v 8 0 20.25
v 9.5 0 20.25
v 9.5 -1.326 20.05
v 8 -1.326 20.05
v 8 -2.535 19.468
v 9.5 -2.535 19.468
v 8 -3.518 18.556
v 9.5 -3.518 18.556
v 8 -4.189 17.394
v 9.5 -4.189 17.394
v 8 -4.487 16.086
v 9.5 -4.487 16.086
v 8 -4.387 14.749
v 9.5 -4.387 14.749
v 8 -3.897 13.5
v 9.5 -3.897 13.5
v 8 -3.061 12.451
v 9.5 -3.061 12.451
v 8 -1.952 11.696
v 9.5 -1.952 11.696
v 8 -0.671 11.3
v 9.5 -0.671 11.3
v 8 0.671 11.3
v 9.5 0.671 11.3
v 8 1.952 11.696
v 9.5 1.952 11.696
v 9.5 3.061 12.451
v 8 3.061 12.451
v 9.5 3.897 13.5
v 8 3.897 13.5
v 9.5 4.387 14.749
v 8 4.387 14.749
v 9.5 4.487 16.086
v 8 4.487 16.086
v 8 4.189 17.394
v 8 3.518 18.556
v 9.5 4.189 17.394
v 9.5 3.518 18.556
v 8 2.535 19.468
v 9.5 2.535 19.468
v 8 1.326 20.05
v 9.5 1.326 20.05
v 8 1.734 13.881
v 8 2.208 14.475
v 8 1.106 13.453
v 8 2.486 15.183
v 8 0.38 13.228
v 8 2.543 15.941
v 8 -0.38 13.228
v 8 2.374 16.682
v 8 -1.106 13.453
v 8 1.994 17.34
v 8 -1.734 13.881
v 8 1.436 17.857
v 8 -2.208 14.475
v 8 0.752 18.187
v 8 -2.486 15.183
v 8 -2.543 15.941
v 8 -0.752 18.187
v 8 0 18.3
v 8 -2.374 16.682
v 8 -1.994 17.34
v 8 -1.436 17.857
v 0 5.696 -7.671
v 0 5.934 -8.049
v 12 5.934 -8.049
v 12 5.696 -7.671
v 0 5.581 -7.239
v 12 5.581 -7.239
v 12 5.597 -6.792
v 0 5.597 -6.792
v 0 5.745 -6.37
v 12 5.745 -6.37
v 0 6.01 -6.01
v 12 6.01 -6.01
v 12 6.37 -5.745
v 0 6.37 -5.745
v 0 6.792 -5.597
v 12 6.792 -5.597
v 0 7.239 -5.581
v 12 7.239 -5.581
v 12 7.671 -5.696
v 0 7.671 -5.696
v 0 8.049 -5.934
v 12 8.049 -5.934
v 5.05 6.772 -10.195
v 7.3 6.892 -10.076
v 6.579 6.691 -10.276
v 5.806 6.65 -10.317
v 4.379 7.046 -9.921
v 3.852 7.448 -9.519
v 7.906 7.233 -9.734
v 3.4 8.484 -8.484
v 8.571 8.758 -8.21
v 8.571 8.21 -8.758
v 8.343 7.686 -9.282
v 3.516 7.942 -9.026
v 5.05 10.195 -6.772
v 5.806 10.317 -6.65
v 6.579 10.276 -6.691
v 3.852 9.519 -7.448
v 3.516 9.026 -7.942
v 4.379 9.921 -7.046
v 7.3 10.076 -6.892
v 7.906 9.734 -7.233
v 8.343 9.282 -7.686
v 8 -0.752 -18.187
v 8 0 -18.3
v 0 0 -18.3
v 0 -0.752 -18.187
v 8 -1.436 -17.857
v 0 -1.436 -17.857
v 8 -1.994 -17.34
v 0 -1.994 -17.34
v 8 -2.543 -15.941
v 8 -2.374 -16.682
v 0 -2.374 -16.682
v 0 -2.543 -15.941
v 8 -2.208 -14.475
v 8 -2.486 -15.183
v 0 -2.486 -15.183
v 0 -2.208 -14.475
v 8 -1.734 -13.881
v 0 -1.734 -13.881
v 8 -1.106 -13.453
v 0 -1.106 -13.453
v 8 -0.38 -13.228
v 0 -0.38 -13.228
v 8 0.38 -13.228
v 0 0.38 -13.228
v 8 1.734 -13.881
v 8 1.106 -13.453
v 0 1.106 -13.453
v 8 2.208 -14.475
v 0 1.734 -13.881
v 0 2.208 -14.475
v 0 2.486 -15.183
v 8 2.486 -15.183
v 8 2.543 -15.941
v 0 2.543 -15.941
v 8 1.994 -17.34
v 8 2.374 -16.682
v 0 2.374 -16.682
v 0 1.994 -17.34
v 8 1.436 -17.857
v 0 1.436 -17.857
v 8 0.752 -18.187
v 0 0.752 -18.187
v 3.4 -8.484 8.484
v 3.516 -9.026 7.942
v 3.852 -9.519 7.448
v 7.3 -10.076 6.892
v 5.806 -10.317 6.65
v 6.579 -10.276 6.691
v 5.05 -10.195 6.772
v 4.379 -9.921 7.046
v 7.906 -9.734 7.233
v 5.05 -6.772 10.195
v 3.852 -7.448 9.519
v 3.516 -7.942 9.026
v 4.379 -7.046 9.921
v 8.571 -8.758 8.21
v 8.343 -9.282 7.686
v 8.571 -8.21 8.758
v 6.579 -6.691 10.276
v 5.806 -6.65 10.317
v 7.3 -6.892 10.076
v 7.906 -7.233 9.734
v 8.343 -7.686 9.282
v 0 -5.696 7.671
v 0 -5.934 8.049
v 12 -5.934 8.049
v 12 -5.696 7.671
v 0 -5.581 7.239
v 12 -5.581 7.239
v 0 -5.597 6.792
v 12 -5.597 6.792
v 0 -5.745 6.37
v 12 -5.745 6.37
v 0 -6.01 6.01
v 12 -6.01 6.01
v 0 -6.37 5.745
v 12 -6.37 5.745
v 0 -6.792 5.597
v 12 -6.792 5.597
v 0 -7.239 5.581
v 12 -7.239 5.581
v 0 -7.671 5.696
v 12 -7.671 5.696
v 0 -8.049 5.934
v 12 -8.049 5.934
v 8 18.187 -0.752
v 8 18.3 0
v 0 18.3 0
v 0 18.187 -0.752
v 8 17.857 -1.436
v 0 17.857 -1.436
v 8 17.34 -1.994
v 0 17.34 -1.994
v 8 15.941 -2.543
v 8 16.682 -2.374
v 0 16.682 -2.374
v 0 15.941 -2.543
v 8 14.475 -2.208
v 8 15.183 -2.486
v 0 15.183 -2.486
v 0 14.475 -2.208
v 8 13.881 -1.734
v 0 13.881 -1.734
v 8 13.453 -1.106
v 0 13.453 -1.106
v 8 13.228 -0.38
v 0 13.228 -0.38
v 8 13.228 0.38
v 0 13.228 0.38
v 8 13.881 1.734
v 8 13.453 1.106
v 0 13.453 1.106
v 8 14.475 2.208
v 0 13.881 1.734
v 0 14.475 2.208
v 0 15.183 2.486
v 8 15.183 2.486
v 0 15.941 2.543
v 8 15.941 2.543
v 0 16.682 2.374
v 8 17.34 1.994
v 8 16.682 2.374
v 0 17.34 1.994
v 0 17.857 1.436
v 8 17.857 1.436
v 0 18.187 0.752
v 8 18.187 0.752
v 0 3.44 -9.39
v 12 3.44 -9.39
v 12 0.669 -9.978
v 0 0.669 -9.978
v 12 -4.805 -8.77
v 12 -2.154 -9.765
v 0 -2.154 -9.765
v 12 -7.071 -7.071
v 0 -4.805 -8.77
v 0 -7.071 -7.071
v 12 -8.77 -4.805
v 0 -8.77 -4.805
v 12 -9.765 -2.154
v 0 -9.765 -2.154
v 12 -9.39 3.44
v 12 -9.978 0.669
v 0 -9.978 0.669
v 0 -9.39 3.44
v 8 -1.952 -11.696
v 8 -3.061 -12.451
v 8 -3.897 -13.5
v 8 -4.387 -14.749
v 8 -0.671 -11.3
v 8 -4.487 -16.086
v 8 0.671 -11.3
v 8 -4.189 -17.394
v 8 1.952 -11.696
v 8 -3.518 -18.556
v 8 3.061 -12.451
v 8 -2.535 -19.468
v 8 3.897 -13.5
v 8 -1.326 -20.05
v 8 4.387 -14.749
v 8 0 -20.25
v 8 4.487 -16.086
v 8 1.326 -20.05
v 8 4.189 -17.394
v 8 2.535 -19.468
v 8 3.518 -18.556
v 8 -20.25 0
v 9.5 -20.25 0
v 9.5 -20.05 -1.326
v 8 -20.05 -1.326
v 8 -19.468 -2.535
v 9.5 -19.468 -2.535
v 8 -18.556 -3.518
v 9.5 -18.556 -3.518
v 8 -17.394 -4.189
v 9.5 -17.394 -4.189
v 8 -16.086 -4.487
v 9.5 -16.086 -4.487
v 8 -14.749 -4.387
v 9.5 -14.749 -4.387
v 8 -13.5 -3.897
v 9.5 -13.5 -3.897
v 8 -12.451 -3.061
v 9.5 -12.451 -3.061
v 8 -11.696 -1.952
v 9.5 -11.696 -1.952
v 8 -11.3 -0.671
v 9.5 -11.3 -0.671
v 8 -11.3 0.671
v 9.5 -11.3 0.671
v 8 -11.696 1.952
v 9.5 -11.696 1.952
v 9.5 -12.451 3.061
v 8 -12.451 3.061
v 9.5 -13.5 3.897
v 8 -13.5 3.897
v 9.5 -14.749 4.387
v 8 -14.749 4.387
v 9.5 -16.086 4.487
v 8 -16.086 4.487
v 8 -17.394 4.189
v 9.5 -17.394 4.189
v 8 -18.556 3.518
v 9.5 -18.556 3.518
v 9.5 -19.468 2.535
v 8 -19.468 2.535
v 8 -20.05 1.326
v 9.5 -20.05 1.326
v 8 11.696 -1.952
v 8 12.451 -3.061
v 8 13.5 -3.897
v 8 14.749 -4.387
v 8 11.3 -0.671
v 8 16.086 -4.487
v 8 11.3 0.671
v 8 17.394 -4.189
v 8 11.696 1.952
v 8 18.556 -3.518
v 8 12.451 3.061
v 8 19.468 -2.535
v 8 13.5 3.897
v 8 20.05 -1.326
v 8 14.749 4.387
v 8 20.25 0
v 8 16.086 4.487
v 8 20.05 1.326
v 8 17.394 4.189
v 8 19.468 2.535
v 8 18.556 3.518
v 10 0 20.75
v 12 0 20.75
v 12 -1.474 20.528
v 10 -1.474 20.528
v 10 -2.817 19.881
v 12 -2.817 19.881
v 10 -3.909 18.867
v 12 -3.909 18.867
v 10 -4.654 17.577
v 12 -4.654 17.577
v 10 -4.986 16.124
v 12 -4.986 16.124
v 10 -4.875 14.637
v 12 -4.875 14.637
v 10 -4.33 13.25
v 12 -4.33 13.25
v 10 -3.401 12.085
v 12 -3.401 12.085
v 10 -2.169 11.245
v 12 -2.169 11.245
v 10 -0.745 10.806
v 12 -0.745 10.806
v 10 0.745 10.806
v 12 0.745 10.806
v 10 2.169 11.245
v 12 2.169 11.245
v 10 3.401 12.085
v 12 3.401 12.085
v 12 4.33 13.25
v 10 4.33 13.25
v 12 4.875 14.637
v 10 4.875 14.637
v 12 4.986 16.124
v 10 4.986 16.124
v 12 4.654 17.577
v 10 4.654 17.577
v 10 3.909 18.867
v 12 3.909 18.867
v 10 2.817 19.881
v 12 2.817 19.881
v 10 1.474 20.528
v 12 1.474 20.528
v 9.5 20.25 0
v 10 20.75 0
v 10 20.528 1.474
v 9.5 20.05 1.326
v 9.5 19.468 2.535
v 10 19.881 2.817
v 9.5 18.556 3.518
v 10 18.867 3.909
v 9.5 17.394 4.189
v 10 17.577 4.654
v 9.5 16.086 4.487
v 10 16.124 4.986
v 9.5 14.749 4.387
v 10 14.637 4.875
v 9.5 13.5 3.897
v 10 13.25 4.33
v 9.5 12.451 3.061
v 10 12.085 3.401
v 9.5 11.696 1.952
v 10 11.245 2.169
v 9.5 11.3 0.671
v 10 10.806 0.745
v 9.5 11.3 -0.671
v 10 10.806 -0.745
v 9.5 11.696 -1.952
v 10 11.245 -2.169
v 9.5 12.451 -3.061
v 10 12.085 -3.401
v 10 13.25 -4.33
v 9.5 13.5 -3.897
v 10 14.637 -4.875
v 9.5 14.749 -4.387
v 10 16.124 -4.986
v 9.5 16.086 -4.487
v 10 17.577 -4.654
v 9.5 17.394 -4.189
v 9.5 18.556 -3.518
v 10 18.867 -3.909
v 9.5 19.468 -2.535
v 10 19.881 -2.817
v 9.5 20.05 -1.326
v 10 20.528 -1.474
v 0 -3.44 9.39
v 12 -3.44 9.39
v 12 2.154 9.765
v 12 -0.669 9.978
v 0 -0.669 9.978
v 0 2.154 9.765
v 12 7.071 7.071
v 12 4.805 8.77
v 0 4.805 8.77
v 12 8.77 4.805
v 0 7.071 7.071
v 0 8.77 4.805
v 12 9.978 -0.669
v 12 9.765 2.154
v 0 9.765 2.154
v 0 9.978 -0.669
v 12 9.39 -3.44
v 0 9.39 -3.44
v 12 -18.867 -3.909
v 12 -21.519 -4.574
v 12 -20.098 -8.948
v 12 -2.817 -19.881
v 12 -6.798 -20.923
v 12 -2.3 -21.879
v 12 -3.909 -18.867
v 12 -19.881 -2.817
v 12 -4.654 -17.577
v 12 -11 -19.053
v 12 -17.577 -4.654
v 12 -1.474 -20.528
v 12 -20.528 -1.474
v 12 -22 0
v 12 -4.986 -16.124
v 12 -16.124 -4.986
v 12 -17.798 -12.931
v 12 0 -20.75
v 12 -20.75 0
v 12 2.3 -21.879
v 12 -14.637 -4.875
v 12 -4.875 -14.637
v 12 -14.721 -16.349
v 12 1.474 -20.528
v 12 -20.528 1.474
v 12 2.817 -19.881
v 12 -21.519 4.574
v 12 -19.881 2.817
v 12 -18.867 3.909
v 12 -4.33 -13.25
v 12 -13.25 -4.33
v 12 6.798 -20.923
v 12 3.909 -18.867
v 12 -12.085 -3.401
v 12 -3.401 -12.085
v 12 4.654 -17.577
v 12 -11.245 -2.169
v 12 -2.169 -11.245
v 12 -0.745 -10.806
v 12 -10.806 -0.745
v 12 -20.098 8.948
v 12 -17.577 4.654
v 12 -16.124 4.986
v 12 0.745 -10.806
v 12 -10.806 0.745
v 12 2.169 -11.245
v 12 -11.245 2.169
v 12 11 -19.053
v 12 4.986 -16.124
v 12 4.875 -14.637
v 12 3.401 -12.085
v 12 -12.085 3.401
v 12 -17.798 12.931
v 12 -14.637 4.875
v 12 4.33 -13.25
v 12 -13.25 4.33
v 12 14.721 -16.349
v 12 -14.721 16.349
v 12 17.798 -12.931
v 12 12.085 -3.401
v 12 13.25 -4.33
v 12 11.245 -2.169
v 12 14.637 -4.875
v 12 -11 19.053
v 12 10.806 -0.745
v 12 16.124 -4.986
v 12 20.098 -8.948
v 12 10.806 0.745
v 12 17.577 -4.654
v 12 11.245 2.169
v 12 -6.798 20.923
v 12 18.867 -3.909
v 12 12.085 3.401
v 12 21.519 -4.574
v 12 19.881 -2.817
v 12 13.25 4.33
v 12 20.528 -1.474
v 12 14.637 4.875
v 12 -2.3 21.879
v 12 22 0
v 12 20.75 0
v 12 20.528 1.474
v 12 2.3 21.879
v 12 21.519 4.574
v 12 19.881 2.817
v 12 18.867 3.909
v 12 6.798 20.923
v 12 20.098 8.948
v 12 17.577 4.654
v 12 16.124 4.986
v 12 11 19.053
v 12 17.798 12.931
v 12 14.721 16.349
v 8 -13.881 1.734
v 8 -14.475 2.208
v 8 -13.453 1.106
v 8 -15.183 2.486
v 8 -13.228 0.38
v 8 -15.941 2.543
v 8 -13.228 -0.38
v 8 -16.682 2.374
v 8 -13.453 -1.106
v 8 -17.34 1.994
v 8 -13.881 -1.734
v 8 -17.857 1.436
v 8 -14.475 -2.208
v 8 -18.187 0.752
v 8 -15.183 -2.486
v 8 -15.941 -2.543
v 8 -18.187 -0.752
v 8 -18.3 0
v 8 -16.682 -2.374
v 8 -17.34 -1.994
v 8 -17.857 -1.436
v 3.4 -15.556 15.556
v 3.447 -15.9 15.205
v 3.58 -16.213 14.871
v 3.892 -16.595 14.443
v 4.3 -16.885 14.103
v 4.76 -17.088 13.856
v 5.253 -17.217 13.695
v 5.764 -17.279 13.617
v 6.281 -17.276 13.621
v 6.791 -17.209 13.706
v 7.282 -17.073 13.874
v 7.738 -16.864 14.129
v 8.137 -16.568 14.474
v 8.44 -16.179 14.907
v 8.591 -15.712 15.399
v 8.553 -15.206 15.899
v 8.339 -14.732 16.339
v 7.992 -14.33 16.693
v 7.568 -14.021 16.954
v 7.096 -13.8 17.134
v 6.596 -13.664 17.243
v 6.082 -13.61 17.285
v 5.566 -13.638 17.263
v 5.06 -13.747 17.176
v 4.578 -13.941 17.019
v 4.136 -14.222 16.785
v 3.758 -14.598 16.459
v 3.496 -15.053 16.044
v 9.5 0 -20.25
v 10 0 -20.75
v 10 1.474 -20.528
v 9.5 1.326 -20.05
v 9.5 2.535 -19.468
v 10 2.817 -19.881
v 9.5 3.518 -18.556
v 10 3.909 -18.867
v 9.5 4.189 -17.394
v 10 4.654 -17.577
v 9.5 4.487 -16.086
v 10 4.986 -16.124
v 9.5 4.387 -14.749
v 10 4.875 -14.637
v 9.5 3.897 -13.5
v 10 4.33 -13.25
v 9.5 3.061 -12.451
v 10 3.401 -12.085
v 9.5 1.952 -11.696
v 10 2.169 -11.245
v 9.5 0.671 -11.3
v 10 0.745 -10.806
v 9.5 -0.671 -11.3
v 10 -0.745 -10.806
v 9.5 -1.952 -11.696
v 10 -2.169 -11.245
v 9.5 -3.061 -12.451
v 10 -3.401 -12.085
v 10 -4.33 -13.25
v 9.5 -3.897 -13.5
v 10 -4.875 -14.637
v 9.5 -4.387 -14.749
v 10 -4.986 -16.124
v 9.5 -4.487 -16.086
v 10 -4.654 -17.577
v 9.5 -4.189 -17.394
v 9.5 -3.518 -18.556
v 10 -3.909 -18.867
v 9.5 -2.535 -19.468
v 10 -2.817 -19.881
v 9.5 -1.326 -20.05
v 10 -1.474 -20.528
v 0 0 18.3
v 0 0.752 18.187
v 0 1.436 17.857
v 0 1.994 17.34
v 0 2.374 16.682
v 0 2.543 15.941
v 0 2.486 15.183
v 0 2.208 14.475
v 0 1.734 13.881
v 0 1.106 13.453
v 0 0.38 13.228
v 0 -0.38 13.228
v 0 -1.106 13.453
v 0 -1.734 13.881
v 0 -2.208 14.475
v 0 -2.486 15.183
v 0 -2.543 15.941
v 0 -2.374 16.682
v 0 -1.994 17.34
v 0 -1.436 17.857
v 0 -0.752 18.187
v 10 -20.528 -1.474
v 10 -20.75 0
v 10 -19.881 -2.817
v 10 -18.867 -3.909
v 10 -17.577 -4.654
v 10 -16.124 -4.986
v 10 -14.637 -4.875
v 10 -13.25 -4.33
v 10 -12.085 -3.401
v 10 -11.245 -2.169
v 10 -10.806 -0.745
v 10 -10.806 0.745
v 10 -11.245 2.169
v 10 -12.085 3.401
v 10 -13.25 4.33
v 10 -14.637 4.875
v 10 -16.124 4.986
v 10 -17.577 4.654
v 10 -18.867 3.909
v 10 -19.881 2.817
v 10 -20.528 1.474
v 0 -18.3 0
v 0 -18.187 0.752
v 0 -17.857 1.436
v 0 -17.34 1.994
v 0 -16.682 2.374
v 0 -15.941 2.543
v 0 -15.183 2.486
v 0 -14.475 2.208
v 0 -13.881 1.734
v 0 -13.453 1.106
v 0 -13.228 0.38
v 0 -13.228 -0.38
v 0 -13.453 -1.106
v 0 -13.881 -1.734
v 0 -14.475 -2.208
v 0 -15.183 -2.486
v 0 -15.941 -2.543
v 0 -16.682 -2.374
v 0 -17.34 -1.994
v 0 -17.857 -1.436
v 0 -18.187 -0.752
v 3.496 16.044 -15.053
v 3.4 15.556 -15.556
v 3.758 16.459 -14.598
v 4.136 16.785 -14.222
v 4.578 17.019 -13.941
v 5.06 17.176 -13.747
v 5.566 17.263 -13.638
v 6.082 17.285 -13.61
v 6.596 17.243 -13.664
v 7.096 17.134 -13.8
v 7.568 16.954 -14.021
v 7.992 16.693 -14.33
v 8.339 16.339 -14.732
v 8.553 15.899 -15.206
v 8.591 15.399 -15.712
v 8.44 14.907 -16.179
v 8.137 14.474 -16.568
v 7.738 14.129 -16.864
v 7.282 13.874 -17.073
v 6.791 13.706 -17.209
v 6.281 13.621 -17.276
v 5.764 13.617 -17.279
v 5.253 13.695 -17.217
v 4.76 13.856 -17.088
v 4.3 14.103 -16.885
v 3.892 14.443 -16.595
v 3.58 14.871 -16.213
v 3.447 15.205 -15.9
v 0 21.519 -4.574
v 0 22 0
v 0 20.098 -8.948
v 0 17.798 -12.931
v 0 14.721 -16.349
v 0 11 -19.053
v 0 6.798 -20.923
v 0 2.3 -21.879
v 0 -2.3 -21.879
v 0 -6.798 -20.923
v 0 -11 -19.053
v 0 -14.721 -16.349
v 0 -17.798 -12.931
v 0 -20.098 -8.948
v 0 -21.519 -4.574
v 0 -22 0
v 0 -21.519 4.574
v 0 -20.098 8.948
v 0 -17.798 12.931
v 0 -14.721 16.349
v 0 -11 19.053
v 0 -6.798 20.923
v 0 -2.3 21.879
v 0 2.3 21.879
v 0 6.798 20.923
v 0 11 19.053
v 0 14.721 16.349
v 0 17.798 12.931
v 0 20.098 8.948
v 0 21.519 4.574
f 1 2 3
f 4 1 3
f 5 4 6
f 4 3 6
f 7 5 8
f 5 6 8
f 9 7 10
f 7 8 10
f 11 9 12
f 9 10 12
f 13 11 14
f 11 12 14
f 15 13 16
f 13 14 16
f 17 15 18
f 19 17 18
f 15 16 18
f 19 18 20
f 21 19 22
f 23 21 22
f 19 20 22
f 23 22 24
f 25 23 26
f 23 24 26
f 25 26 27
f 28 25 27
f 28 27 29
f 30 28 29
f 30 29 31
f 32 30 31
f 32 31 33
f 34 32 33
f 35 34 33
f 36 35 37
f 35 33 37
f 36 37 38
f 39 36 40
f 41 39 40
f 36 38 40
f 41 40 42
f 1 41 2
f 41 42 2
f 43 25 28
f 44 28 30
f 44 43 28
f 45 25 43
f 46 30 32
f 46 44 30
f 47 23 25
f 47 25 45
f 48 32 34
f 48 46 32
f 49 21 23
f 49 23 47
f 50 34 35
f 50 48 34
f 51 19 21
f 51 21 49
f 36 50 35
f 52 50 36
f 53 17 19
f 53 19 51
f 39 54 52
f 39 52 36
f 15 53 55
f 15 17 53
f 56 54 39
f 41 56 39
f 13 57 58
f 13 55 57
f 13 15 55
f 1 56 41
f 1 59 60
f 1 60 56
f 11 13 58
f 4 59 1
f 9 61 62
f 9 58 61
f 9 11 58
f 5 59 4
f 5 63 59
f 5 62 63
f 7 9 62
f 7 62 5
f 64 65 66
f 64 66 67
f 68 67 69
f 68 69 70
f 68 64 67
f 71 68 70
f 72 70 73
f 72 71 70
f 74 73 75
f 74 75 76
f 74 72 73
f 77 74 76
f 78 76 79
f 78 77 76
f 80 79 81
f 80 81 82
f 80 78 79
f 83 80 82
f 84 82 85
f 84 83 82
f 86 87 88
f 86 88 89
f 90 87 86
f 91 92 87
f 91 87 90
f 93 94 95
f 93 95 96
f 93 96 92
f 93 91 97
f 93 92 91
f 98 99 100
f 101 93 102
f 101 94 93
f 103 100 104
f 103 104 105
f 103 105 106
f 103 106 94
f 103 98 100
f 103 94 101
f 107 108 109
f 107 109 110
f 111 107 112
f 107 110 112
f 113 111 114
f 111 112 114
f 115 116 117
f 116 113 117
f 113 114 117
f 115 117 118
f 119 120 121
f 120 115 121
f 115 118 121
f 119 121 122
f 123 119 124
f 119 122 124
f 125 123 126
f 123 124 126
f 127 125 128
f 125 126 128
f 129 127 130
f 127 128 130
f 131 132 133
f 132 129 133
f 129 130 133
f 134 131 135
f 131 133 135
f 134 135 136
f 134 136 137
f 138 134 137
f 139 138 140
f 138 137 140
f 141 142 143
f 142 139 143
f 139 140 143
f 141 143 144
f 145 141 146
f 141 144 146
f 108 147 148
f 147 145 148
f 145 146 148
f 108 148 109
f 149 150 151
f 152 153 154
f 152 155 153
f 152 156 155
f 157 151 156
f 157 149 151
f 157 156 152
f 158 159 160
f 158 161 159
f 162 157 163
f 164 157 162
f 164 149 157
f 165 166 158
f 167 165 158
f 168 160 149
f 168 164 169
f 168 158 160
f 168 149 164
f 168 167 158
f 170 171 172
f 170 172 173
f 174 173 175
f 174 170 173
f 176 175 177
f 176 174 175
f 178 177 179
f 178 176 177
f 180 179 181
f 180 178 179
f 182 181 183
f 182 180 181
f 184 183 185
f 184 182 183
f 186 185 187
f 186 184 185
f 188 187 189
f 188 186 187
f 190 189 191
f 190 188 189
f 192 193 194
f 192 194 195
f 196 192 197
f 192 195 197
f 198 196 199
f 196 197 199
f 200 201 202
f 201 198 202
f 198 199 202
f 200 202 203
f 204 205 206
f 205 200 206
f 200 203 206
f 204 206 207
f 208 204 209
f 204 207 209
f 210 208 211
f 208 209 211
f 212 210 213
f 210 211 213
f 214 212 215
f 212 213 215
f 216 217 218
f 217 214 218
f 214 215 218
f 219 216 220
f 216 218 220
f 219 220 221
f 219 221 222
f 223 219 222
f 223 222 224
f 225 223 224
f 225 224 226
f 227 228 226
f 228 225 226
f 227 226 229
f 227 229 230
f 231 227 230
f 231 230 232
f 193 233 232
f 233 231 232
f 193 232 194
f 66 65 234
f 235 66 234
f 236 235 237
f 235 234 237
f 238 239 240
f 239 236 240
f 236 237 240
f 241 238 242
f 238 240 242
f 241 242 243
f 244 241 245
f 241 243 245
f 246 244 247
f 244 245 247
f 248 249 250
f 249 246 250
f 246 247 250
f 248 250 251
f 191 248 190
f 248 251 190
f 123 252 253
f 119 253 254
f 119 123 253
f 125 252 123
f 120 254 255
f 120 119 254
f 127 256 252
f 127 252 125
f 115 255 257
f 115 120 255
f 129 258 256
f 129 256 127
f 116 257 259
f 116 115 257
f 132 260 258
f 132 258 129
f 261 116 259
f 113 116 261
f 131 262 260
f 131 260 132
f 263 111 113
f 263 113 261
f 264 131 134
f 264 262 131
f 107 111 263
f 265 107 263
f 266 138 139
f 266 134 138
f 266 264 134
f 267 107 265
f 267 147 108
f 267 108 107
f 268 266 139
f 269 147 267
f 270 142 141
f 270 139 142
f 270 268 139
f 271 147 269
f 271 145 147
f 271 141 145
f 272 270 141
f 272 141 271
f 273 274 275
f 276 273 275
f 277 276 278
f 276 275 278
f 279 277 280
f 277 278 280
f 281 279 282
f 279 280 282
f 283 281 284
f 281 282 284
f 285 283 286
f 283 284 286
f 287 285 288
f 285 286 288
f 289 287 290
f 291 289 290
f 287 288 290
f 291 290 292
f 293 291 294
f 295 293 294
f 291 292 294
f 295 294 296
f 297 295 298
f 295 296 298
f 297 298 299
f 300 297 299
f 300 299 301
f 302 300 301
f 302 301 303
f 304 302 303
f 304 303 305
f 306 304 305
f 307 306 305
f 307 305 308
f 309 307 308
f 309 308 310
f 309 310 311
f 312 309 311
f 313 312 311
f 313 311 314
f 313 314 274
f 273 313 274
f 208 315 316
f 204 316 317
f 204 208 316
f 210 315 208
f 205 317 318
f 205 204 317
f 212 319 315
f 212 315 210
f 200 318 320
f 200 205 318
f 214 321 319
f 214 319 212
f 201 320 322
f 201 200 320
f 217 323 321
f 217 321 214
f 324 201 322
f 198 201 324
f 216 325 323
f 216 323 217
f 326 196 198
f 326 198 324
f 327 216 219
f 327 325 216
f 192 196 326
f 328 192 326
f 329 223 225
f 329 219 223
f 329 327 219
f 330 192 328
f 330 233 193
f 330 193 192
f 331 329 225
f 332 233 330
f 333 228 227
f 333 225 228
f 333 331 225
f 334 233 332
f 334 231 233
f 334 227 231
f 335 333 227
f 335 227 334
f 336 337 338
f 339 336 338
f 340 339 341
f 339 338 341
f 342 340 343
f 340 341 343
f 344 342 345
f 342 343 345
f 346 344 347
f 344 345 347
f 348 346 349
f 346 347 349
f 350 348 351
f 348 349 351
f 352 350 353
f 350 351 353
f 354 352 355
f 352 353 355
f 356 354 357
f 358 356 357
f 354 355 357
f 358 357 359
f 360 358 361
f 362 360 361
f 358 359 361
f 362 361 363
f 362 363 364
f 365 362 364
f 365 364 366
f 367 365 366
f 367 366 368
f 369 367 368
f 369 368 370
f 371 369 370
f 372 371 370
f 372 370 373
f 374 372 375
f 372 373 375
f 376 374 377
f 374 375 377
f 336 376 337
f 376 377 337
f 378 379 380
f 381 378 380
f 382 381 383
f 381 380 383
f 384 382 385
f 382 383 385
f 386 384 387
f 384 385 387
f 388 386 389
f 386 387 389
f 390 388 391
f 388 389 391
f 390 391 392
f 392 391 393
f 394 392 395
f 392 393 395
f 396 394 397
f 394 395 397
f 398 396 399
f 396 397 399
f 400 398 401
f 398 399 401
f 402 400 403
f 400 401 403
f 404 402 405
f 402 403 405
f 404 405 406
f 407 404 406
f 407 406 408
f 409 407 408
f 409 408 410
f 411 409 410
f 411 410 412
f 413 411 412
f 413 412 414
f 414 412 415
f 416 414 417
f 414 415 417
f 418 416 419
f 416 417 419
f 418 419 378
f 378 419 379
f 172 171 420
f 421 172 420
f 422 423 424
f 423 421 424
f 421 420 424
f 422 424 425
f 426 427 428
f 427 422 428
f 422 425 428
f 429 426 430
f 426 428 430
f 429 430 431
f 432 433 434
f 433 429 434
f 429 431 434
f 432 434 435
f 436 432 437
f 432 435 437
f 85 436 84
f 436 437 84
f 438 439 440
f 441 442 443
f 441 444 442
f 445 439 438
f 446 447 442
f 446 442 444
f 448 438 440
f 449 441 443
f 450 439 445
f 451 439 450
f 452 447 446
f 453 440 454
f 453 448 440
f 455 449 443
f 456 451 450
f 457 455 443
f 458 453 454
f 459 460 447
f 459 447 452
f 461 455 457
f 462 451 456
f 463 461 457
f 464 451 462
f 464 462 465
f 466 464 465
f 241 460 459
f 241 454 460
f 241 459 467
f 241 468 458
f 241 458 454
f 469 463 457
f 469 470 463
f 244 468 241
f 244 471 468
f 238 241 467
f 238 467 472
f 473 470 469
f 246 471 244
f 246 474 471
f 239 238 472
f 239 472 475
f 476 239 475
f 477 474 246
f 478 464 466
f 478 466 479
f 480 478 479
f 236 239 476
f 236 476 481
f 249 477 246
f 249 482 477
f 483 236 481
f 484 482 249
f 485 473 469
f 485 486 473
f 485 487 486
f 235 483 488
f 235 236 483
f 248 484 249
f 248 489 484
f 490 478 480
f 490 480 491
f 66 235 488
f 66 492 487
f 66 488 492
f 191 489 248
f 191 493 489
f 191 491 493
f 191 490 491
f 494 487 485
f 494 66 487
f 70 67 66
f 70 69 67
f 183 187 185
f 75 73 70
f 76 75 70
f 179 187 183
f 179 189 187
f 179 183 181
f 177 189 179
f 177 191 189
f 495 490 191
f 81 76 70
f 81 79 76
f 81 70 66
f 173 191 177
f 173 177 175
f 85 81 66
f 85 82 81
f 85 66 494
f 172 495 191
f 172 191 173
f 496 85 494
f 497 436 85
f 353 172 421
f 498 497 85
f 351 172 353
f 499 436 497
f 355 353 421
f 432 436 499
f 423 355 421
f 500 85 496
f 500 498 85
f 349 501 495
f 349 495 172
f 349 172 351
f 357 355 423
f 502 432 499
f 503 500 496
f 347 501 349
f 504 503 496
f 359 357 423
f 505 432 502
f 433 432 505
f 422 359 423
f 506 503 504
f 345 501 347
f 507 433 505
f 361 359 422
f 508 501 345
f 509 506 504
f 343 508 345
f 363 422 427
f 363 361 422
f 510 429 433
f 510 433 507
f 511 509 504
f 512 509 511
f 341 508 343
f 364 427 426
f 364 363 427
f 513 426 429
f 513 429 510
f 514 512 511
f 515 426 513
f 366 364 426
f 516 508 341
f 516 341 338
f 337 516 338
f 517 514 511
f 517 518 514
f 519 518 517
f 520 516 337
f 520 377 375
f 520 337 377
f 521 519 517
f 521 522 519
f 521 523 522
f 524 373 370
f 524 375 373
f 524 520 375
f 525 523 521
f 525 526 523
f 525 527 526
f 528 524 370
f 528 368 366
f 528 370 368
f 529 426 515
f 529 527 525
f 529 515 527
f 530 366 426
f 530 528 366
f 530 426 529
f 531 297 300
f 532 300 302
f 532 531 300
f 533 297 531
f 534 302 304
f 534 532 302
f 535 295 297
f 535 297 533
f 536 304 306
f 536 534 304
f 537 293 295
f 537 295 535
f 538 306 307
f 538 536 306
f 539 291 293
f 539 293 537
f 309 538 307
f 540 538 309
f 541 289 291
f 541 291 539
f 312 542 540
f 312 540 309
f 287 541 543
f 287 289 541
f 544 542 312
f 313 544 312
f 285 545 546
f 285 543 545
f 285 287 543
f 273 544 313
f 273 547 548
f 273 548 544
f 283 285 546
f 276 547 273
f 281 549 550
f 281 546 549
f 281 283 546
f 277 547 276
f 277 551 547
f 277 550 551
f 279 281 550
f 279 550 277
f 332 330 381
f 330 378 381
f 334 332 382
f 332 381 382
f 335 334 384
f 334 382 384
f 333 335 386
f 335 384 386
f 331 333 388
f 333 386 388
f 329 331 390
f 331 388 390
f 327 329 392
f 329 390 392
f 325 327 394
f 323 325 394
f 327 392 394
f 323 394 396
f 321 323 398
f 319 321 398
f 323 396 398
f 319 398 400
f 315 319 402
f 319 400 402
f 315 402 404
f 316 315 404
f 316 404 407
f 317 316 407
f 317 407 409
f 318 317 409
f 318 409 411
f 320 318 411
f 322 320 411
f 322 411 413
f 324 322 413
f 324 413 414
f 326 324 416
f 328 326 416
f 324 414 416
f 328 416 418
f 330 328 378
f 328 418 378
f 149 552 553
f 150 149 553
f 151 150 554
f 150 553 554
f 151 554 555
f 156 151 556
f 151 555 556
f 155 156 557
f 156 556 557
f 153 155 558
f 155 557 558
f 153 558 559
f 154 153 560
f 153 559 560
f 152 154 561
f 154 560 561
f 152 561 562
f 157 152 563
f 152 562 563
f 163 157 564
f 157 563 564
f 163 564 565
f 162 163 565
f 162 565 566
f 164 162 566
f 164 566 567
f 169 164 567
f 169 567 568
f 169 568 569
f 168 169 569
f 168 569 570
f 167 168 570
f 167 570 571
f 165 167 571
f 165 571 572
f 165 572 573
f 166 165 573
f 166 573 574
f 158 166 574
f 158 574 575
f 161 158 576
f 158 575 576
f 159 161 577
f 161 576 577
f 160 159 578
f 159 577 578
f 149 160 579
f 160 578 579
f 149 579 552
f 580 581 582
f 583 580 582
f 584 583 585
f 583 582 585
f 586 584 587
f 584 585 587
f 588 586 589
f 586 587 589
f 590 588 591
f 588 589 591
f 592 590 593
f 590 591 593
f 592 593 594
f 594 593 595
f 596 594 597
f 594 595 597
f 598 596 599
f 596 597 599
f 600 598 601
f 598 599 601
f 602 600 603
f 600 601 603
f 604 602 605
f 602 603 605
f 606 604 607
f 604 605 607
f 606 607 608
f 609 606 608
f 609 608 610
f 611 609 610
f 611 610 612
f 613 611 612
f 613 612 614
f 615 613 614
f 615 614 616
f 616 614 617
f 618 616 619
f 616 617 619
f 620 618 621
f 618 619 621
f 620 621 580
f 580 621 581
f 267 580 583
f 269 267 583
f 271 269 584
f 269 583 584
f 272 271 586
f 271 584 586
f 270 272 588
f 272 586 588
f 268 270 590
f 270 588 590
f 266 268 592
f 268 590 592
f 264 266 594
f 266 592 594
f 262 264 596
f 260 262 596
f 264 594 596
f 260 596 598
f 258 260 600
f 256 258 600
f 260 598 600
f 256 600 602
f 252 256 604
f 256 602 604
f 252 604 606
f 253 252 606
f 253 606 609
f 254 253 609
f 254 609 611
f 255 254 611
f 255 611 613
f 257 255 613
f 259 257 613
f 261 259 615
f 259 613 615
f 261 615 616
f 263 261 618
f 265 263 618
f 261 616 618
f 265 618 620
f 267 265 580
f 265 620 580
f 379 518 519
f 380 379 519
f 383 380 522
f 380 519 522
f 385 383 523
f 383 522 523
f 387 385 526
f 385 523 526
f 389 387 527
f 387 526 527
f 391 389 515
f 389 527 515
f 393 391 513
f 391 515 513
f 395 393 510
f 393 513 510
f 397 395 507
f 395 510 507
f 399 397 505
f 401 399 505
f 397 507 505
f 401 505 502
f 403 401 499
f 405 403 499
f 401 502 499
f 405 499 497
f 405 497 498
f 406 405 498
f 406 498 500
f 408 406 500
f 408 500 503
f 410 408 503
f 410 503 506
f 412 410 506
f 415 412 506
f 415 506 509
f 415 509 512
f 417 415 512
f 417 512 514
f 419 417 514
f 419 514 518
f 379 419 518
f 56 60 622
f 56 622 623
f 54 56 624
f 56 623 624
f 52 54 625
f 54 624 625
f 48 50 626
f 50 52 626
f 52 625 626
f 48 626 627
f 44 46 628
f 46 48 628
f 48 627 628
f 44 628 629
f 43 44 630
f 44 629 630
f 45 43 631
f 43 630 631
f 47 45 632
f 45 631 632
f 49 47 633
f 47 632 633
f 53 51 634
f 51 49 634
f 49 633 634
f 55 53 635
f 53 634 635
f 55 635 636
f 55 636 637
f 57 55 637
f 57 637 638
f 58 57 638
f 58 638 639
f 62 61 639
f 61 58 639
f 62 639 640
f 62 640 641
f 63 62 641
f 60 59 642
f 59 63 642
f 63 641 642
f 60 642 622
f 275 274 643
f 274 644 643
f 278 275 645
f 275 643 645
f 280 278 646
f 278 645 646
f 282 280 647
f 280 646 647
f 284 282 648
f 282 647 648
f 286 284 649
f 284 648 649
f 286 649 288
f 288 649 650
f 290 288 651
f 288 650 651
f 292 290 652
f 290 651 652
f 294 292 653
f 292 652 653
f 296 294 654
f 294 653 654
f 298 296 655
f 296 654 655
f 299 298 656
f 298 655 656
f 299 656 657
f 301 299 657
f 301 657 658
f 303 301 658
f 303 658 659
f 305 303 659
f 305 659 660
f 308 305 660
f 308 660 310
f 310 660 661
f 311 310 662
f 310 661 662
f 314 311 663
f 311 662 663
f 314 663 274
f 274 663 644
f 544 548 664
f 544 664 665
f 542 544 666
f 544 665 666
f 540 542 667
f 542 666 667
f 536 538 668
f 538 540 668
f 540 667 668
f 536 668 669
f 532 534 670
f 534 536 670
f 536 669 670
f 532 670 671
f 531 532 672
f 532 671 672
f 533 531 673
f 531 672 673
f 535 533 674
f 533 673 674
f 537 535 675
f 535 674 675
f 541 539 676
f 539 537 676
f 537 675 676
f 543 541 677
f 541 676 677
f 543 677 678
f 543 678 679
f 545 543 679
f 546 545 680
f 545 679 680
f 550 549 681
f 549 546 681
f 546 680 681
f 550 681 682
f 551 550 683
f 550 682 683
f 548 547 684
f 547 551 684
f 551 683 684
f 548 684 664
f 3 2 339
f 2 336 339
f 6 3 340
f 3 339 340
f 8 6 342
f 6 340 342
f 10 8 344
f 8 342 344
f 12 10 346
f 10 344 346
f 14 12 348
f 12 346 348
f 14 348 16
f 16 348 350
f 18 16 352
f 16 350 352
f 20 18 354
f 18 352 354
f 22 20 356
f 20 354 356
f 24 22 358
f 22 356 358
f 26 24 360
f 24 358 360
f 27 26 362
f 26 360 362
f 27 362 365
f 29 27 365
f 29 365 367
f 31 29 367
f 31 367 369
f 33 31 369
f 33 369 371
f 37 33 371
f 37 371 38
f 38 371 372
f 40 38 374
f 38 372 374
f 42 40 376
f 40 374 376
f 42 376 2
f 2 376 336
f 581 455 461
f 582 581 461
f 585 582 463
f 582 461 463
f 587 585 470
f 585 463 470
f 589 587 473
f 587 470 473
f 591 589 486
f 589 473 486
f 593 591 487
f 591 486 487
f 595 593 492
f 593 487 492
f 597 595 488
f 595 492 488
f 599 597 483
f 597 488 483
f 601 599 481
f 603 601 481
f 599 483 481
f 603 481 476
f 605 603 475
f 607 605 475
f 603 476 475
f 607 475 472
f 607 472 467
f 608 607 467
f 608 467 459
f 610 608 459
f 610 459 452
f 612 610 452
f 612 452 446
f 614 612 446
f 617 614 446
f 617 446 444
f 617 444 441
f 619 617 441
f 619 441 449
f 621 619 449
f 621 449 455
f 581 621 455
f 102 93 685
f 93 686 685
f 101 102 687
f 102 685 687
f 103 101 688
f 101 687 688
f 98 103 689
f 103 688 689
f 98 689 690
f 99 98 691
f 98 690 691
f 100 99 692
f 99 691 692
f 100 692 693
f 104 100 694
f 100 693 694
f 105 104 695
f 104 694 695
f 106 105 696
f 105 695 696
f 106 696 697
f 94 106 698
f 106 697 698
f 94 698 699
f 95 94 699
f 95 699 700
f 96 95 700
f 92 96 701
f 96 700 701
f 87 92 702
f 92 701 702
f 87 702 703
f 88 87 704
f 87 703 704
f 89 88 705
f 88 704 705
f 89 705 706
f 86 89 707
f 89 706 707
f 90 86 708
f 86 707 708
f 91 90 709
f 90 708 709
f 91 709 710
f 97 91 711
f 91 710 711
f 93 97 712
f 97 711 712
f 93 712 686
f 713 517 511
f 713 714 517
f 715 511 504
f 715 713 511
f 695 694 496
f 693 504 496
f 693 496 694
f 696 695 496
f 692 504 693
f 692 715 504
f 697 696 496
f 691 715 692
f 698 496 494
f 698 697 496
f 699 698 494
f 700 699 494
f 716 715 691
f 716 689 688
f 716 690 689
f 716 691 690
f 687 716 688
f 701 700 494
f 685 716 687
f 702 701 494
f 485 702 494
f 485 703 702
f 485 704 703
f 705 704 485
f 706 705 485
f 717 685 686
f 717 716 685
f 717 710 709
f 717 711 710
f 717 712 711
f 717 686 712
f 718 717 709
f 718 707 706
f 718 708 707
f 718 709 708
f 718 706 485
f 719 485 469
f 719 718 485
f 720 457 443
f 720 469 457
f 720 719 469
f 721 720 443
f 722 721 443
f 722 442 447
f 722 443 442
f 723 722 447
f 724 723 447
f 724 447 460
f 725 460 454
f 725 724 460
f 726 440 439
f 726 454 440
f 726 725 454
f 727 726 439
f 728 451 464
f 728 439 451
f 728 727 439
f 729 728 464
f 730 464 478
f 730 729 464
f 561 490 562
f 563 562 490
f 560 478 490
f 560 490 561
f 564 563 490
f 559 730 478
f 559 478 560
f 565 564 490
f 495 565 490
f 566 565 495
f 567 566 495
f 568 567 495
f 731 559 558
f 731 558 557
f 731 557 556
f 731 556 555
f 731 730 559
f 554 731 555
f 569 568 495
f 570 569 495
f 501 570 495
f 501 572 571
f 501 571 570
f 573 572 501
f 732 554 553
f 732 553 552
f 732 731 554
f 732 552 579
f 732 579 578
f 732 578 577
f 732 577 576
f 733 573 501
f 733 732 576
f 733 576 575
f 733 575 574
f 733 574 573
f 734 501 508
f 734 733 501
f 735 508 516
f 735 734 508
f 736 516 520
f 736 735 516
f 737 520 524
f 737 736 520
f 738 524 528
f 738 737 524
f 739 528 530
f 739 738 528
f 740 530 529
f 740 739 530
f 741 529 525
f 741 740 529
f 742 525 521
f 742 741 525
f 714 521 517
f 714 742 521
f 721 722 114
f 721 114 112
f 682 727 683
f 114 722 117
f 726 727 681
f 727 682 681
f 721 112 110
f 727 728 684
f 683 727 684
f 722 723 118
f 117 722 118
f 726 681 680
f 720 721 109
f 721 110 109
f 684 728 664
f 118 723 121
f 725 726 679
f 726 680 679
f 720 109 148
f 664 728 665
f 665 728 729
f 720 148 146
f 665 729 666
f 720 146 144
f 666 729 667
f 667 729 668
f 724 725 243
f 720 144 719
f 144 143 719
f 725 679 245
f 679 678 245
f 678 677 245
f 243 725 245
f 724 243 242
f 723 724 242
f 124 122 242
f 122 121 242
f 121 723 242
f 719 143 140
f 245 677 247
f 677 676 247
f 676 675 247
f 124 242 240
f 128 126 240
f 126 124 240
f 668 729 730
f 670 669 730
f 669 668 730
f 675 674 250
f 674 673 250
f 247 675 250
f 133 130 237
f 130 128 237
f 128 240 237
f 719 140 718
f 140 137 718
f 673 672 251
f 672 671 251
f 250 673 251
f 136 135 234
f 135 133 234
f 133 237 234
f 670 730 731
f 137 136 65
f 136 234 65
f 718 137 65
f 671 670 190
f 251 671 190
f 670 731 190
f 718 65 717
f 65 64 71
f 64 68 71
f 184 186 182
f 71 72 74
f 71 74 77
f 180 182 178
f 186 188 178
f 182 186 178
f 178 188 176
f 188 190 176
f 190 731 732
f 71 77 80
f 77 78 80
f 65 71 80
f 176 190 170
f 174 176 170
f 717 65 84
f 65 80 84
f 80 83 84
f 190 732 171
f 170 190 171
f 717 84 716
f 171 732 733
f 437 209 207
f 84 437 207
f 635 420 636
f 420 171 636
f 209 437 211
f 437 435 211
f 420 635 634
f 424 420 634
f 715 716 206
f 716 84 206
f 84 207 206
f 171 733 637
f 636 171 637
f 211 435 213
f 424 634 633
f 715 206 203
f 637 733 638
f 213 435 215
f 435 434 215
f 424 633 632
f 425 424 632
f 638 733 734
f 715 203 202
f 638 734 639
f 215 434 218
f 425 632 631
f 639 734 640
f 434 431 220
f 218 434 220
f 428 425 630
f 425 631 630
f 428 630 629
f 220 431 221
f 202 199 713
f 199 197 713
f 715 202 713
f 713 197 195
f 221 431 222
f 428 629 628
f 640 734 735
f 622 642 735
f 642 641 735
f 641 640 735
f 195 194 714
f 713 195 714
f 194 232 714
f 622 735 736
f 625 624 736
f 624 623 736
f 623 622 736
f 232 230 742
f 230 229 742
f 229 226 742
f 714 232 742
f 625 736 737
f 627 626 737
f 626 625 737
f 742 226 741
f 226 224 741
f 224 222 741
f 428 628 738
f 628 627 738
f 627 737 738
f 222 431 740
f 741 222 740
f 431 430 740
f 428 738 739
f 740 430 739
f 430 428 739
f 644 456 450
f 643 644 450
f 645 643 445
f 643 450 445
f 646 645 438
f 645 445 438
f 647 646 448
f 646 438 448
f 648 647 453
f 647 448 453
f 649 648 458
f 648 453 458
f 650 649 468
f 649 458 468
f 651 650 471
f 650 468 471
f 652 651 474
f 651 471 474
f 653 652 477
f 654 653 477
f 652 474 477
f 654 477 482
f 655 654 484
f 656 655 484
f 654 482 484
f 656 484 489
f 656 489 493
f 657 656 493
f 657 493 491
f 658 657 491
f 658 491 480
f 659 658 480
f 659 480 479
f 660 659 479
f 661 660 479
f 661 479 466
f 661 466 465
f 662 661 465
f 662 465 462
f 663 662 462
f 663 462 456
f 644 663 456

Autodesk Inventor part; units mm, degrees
ref_plane "YZ Plane" through (0, 0, 0) normal (1, 0, 0) x (0, 1, 0)
ref_plane "XZ Plane" through (0, 0, 0) normal (0, 1, 0) x (-1, 0, 0)
ref_plane "XY Plane" through (0, 0, 0) normal (0, 0, 1) x (1, 0, 0)
sketch "Sketch2" plane through (0, 0, 0) normal (1, 0, 0) x (0, 1, 0)
  circle A0 centre (0, 0) radius 10
  circle A1 centre (0, 0) radius 22
  line L0 (0, 0) -> (7.0711, -7.0711)
  line L1 (0, 0) -> (10, 0) construction
  circle A2 centre (7.0711, -7.0711) radius 1.5
  line L2 (0, 0) -> (10.8294, 10.8294)
  line L3 (0, 0) -> (15.315, 0) construction
  circle A3 centre (-7.0711, 7.0711) radius 1.5
  dimension "d3" = 20
  dimension "d4" = 44
  dimension "d16" = 10
  dimension "d17" = 45
  dimension "d18" = 3
  dimension "d19" = 45
extrude "Extrusion1" add sketch "Sketch2" along normal blind 12 contours A2 A0 | A0 L0 A2 | A3 A0 | A0 A3 | A0 A2 L0 | A1
sketch "Sketch4" plane through (0, 0, 0) normal (1, 0, 0) x (0, 0, -1)
  circle A0 centre (0, 0) radius 15.75
  circle A1 centre (15.75, 0) radius 2.55
  dimension "d9" = 31.5
  dimension "d10" = 5.1
extrude "Extrusion3" cut sketch "Sketch4" along normal blind 30 contours A0 A1 | A0 A1 picked at (14.9184, -0.4924) picked at (16.4994, -0.6699)
sketch "Sketch5" plane through (12, 0, 0) normal (1, 0, 0) x (0, 0, -1)
  circle A0 centre (15.75, 0) radius 2.55 projected
  circle A1 centre (15.75, 0) radius 4.5
  point P0 (0, 0)
  dimension "d20" = 9
extrude "Extrusion4" cut sketch "Sketch5" against normal blind 4
sketch "Sketch6" plane through (12, 0, 0) normal (1, 0, 0) x (0, 0, -1)
  line L0 (0, 0) -> (15.5563, 15.5563)
  line L1 (0, 0) -> (22, 0) construction
  dimension "d23" = 22
  dimension "d24" = 45
ref_plane "Work Plane1" through (12, 15.5563, -15.5563) normal (0, 0.7071068, -0.7071068) x (-1, 0, 0)
sketch "Sketch7" plane through (12, 15.5563, -15.5563) normal (0, 0.7071068, -0.7071068) x (-1, 0, 0)
  line L0 (0, 22) -> (0, -22) projected
  line L1 (0, 0) -> (12, 0)
  circle A0 centre (6, 0) radius 2.6
  dimension "d25" = 5.2
extrude "Extrusion5" cut sketch "Sketch7" against normal blind 10
ref_plane "Work Plane2" through (12, 0, 0) normal (0, 0.7071068, -0.7071068) x (-1, 0, 0)
thread "Thread1" size "M5x0.8" class "6H" standard "ANSI Metric M Profile" full length
mirror "Mirror1" about plane through (12, 0, 0) normal (0, 0.7071068, -0.7071068) of "Extrusion5"
sketch "Sketch8" plane through (12, 0, 0) normal (1, 0, 0) x (0, 0, -1)
  line L0 (0, 0) -> (22, 0) construction
  circle A0 centre (15.75, 0) radius 2.55 projected
  circle A1 centre (15.75, 0) radius 5
  dimension "d33" = 10
extrude "Extrusion6" cut sketch "Sketch8" against normal blind 2
chamfer "Chamfer2" distance 0.5 angle 45 1 edges at (10, 0, -11.25)
pattern_circular "Circular Pattern1" count 4 over 360 about axis through (-10, 0, 0) along (1, 0, 0) of "Extrusion3", "Extrusion4", "Extrusion6", "Chamfer2"
properties part number "Pen Holder Interface V2"
